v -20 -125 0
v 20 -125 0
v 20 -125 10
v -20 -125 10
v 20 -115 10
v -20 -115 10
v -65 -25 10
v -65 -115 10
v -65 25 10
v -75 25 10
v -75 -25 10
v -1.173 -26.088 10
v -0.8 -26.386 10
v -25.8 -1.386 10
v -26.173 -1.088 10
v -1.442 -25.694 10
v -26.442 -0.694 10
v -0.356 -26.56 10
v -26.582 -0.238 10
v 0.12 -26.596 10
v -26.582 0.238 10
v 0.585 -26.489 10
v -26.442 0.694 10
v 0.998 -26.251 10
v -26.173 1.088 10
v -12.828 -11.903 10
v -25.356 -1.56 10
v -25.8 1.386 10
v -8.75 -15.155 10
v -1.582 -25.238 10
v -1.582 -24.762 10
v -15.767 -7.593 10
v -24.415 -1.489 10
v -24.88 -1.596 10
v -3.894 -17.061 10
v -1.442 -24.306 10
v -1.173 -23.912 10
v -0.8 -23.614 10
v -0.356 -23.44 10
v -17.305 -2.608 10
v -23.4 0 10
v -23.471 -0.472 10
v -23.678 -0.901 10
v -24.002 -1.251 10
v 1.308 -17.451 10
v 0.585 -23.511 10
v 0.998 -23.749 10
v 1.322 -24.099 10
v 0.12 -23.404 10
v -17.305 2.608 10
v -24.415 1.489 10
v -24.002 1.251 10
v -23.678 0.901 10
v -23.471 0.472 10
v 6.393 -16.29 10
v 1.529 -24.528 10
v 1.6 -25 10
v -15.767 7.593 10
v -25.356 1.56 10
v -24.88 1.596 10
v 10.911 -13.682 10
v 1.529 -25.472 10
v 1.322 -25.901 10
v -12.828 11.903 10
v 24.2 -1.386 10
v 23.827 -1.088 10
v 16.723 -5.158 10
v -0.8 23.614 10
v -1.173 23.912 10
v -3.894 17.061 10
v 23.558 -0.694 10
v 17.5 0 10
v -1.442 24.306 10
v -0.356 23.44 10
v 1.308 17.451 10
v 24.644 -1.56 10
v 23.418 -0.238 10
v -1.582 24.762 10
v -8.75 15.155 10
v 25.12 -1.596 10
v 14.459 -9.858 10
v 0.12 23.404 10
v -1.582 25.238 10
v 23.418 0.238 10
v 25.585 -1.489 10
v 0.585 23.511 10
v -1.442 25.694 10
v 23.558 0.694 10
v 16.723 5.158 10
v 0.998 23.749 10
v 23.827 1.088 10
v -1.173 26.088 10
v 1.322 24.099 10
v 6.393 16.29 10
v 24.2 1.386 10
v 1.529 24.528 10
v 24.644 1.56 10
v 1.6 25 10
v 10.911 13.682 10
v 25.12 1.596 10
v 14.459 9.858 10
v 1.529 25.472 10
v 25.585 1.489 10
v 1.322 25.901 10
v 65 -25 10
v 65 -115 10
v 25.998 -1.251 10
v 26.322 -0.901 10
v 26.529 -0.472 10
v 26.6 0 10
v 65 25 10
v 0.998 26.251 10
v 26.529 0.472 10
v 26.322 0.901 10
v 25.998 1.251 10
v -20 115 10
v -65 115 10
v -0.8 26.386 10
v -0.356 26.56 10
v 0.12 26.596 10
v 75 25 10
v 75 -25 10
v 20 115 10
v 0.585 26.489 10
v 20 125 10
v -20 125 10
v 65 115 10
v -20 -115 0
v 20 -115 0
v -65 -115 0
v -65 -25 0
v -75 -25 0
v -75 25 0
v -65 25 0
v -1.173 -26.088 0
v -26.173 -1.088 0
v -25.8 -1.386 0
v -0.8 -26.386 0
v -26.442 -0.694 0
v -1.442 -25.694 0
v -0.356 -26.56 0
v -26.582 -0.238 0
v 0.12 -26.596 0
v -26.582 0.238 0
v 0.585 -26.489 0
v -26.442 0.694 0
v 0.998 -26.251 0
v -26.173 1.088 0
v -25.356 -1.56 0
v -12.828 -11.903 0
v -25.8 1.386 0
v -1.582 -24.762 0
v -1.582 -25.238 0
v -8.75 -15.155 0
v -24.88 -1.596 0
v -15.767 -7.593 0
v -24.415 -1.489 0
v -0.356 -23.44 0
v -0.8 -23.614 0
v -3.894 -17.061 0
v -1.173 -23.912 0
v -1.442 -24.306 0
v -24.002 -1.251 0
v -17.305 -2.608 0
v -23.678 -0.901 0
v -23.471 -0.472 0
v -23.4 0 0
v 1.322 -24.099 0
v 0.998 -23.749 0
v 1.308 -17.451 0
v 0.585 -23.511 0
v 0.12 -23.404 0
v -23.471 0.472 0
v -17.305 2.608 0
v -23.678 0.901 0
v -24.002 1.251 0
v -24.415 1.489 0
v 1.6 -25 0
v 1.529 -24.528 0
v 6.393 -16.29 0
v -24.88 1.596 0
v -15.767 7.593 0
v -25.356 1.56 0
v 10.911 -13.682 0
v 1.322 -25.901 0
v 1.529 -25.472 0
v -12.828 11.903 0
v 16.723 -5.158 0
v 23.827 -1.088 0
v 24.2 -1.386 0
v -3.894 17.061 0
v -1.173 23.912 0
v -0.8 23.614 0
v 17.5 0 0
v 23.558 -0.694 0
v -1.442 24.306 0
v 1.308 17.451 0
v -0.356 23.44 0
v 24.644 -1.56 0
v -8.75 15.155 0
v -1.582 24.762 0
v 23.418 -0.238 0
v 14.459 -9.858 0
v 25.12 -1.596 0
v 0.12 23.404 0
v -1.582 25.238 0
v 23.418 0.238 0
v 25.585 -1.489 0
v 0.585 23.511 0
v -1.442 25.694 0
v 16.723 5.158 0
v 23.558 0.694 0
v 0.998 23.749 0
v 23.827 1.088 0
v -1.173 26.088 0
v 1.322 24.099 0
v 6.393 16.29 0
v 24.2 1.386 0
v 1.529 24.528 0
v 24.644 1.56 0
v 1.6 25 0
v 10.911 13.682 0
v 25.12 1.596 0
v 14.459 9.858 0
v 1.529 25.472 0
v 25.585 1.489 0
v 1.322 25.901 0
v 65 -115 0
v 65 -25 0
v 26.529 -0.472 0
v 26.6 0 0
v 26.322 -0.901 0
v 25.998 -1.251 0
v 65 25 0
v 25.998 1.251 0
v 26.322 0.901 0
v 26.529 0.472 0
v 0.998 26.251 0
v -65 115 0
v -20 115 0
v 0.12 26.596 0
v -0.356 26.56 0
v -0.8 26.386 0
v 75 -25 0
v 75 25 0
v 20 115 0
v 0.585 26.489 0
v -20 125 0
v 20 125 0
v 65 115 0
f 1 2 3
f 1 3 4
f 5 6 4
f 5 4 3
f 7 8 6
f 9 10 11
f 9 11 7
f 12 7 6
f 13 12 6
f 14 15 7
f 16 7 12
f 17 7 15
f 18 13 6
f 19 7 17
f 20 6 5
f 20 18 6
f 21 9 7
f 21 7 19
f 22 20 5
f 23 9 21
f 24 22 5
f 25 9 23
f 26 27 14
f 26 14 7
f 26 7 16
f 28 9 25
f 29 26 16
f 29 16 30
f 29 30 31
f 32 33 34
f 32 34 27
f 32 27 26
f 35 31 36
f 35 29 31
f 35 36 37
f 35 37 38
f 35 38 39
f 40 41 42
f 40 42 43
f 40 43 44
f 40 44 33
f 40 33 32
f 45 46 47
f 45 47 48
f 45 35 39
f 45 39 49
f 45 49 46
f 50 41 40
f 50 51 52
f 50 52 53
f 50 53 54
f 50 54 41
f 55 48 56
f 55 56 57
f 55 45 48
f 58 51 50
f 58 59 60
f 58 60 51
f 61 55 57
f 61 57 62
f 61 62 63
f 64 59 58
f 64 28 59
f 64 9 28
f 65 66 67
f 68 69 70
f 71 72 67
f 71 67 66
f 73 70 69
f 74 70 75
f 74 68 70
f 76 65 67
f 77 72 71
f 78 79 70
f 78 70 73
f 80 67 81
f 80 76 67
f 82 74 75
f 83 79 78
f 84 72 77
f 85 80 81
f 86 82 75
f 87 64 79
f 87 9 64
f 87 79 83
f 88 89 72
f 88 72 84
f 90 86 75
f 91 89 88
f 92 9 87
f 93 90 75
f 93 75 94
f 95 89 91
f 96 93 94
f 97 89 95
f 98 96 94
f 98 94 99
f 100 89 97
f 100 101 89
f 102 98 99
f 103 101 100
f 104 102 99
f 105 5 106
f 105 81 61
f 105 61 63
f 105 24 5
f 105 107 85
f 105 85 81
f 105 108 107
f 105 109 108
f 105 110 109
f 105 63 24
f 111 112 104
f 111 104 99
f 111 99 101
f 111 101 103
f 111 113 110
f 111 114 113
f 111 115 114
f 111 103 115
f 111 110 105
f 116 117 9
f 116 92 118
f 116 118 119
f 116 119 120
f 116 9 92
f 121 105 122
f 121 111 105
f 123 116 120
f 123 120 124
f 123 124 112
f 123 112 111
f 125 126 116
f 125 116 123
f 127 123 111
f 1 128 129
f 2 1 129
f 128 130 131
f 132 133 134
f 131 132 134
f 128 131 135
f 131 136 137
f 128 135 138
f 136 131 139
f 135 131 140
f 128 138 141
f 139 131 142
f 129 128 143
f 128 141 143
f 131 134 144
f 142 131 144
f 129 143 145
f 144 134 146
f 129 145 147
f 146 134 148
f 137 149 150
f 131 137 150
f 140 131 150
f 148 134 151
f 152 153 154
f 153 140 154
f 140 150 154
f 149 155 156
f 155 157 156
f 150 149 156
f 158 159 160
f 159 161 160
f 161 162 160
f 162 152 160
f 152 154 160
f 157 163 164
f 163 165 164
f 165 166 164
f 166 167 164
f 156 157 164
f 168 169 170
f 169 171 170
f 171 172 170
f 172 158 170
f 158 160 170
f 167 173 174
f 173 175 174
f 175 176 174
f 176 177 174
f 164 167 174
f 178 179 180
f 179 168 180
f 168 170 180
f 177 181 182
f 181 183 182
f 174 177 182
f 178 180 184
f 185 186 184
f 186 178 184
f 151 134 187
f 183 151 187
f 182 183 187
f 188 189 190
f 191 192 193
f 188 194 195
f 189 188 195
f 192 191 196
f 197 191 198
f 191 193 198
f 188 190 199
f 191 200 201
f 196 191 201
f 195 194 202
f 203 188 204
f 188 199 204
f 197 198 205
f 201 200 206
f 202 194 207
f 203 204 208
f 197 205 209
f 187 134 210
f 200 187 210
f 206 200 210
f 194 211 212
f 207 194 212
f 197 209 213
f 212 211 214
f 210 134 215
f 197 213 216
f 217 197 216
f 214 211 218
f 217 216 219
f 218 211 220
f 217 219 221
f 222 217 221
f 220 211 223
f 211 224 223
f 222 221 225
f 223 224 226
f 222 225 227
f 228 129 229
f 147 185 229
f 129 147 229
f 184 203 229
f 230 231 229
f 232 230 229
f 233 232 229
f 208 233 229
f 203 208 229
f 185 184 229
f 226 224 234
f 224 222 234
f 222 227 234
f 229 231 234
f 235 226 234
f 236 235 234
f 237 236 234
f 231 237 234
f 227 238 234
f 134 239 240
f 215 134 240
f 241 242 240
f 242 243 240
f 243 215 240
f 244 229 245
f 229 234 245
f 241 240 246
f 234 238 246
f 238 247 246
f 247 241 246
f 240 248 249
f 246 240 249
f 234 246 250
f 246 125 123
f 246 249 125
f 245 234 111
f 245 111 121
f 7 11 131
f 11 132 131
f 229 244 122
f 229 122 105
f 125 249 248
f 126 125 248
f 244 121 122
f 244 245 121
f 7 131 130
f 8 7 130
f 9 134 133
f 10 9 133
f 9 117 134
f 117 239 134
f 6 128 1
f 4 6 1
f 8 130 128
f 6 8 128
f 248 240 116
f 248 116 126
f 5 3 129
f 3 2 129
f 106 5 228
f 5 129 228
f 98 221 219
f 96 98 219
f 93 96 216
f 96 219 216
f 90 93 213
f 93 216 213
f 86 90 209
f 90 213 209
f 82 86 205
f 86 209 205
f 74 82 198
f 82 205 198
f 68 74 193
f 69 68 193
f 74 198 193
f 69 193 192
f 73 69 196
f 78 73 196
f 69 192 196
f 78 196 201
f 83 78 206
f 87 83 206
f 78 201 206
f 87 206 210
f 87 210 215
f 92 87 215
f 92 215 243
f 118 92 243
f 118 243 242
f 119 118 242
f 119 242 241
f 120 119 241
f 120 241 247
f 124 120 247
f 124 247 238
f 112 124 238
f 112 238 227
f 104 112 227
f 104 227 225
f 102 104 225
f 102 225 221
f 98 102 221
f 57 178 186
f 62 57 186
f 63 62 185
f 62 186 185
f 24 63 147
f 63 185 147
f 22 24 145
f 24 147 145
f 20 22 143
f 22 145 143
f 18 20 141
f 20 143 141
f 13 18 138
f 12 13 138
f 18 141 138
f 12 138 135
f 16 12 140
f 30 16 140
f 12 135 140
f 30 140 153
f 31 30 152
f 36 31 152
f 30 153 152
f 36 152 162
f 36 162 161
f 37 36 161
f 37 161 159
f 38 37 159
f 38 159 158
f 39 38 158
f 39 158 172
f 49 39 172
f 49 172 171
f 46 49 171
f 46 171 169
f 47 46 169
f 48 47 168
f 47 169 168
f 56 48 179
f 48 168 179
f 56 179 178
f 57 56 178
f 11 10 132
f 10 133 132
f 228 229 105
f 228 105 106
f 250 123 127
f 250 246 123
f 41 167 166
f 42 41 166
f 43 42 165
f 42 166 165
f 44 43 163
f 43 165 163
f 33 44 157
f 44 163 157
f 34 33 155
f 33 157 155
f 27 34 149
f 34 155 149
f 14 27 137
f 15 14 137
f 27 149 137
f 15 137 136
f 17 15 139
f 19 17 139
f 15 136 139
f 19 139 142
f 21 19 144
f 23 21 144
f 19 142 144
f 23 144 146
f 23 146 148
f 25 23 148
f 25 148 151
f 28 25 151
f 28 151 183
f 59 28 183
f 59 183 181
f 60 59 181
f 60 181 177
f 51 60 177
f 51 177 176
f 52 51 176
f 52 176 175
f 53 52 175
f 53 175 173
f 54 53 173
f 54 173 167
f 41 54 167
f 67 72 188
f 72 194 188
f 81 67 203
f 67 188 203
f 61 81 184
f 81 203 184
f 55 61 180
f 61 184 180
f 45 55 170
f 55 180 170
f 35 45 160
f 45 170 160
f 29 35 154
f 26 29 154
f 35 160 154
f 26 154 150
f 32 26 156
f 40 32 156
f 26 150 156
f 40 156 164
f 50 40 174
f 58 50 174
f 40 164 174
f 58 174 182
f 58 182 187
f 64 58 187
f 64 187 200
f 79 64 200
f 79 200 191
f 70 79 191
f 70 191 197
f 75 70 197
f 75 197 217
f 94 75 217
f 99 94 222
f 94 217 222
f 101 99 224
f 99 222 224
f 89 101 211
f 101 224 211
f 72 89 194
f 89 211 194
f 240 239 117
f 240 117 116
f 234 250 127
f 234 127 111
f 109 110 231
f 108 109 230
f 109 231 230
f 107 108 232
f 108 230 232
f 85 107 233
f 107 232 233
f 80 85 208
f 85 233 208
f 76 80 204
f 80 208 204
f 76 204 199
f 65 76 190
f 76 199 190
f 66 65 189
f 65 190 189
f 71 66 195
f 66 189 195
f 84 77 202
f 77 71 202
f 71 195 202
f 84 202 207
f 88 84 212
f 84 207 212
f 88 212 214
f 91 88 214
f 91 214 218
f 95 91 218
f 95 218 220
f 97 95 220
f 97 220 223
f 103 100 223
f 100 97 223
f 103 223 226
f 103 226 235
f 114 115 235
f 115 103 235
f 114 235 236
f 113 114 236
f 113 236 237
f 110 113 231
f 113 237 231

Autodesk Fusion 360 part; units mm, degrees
sketch "Esquisse1" plane through (0, 0, 0) normal (0, 0, 1) x (1, 0, 0)
  line L0 (75, -125) -> (-75, -125) construction
  line L1 (-75, -125) -> (-75, 125) construction
  line L2 (-75, 125) -> (75, 125) construction
  line L3 (75, 125) -> (75, -125) construction
  line L4 (75, -125) -> (-75, 125) construction
  line L5 (-75, -125) -> (75, 125) construction
  circle A0 centre (0, 0) radius 17.5
  circle A1 centre (0, 0) radius 25 construction
  circle A2 centre (0, 25) radius 1.6
  circle A3 centre (-25, 0) radius 1.6
  circle A4 centre (0, -25) radius 1.6
  circle A5 centre (25, 0) radius 1.6
  line L6 (0, 125) -> (0, -125)
  line L7 (-75, 0) -> (75, 0)
  line L8 (75, 125) -> (-75, 125) construction
  line L9 (-75, -125) -> (75, -125) construction
  line L10 (75, -125) -> (-75, -125) construction
  line L11 (-65, 115) -> (-65, 25)
  line L12 (-65, 25) -> (-75, 25)
  line L13 (-75, 25) -> (-75, -25)
  line L14 (-75, -25) -> (-65, -25)
  line L15 (-65, -25) -> (-65, -115)
  line L16 (65, 115) -> (65, 25)
  line L17 (65, 25) -> (75, 25)
  line L18 (75, -125) -> (75, 125) construction
  line L19 (75, -25) -> (65, -25)
  line L20 (65, -25) -> (65, -115)
  line L21 (75, 25) -> (75, -25)
  line L22 (-65, 115) -> (-20, 115)
  line L23 (-20, 115) -> (-20, 125)
  line L24 (20, 125) -> (-20, 125)
  line L25 (20, 125) -> (20, 115)
  line L26 (20, 115) -> (65, 115)
  line L27 (20, -125) -> (20, -115)
  line L28 (20, -115) -> (65, -115)
  line L29 (20, -125) -> (-20, -125)
  line L30 (-20, -115) -> (-20, -125)
  line L31 (-65, -115) -> (-20, -115)
  circle A6 centre (0, 0) radius 33.25 construction
  dimension "d1" = 150
  dimension "d2" = 250
  dimension "d3" = 35
  dimension "d5" = 3.2
  dimension "d9" = 50
  dimension "d14" = 40
  dimension "d15" = 10
  dimension "d16" = 10
  dimension "d17" = 66.5
  dimension "d18" = 50
  dimension "d25" = 10
extrude "Extrusion1" add sketch "Esquisse1" along normal blind 10 contours A0 A4 A5 L6 L7 L19 L20 L21 L27 L28 L29 | A0 A2 A5 L6 L7 L16 L17 L21 L24 L25 L26 | A0 A2 A3 L6 L7 L11 L12 L13 L22 L23 L24 | A0 A3 A4 L6 L7 L13 L14 L15 L29 L30 L31
